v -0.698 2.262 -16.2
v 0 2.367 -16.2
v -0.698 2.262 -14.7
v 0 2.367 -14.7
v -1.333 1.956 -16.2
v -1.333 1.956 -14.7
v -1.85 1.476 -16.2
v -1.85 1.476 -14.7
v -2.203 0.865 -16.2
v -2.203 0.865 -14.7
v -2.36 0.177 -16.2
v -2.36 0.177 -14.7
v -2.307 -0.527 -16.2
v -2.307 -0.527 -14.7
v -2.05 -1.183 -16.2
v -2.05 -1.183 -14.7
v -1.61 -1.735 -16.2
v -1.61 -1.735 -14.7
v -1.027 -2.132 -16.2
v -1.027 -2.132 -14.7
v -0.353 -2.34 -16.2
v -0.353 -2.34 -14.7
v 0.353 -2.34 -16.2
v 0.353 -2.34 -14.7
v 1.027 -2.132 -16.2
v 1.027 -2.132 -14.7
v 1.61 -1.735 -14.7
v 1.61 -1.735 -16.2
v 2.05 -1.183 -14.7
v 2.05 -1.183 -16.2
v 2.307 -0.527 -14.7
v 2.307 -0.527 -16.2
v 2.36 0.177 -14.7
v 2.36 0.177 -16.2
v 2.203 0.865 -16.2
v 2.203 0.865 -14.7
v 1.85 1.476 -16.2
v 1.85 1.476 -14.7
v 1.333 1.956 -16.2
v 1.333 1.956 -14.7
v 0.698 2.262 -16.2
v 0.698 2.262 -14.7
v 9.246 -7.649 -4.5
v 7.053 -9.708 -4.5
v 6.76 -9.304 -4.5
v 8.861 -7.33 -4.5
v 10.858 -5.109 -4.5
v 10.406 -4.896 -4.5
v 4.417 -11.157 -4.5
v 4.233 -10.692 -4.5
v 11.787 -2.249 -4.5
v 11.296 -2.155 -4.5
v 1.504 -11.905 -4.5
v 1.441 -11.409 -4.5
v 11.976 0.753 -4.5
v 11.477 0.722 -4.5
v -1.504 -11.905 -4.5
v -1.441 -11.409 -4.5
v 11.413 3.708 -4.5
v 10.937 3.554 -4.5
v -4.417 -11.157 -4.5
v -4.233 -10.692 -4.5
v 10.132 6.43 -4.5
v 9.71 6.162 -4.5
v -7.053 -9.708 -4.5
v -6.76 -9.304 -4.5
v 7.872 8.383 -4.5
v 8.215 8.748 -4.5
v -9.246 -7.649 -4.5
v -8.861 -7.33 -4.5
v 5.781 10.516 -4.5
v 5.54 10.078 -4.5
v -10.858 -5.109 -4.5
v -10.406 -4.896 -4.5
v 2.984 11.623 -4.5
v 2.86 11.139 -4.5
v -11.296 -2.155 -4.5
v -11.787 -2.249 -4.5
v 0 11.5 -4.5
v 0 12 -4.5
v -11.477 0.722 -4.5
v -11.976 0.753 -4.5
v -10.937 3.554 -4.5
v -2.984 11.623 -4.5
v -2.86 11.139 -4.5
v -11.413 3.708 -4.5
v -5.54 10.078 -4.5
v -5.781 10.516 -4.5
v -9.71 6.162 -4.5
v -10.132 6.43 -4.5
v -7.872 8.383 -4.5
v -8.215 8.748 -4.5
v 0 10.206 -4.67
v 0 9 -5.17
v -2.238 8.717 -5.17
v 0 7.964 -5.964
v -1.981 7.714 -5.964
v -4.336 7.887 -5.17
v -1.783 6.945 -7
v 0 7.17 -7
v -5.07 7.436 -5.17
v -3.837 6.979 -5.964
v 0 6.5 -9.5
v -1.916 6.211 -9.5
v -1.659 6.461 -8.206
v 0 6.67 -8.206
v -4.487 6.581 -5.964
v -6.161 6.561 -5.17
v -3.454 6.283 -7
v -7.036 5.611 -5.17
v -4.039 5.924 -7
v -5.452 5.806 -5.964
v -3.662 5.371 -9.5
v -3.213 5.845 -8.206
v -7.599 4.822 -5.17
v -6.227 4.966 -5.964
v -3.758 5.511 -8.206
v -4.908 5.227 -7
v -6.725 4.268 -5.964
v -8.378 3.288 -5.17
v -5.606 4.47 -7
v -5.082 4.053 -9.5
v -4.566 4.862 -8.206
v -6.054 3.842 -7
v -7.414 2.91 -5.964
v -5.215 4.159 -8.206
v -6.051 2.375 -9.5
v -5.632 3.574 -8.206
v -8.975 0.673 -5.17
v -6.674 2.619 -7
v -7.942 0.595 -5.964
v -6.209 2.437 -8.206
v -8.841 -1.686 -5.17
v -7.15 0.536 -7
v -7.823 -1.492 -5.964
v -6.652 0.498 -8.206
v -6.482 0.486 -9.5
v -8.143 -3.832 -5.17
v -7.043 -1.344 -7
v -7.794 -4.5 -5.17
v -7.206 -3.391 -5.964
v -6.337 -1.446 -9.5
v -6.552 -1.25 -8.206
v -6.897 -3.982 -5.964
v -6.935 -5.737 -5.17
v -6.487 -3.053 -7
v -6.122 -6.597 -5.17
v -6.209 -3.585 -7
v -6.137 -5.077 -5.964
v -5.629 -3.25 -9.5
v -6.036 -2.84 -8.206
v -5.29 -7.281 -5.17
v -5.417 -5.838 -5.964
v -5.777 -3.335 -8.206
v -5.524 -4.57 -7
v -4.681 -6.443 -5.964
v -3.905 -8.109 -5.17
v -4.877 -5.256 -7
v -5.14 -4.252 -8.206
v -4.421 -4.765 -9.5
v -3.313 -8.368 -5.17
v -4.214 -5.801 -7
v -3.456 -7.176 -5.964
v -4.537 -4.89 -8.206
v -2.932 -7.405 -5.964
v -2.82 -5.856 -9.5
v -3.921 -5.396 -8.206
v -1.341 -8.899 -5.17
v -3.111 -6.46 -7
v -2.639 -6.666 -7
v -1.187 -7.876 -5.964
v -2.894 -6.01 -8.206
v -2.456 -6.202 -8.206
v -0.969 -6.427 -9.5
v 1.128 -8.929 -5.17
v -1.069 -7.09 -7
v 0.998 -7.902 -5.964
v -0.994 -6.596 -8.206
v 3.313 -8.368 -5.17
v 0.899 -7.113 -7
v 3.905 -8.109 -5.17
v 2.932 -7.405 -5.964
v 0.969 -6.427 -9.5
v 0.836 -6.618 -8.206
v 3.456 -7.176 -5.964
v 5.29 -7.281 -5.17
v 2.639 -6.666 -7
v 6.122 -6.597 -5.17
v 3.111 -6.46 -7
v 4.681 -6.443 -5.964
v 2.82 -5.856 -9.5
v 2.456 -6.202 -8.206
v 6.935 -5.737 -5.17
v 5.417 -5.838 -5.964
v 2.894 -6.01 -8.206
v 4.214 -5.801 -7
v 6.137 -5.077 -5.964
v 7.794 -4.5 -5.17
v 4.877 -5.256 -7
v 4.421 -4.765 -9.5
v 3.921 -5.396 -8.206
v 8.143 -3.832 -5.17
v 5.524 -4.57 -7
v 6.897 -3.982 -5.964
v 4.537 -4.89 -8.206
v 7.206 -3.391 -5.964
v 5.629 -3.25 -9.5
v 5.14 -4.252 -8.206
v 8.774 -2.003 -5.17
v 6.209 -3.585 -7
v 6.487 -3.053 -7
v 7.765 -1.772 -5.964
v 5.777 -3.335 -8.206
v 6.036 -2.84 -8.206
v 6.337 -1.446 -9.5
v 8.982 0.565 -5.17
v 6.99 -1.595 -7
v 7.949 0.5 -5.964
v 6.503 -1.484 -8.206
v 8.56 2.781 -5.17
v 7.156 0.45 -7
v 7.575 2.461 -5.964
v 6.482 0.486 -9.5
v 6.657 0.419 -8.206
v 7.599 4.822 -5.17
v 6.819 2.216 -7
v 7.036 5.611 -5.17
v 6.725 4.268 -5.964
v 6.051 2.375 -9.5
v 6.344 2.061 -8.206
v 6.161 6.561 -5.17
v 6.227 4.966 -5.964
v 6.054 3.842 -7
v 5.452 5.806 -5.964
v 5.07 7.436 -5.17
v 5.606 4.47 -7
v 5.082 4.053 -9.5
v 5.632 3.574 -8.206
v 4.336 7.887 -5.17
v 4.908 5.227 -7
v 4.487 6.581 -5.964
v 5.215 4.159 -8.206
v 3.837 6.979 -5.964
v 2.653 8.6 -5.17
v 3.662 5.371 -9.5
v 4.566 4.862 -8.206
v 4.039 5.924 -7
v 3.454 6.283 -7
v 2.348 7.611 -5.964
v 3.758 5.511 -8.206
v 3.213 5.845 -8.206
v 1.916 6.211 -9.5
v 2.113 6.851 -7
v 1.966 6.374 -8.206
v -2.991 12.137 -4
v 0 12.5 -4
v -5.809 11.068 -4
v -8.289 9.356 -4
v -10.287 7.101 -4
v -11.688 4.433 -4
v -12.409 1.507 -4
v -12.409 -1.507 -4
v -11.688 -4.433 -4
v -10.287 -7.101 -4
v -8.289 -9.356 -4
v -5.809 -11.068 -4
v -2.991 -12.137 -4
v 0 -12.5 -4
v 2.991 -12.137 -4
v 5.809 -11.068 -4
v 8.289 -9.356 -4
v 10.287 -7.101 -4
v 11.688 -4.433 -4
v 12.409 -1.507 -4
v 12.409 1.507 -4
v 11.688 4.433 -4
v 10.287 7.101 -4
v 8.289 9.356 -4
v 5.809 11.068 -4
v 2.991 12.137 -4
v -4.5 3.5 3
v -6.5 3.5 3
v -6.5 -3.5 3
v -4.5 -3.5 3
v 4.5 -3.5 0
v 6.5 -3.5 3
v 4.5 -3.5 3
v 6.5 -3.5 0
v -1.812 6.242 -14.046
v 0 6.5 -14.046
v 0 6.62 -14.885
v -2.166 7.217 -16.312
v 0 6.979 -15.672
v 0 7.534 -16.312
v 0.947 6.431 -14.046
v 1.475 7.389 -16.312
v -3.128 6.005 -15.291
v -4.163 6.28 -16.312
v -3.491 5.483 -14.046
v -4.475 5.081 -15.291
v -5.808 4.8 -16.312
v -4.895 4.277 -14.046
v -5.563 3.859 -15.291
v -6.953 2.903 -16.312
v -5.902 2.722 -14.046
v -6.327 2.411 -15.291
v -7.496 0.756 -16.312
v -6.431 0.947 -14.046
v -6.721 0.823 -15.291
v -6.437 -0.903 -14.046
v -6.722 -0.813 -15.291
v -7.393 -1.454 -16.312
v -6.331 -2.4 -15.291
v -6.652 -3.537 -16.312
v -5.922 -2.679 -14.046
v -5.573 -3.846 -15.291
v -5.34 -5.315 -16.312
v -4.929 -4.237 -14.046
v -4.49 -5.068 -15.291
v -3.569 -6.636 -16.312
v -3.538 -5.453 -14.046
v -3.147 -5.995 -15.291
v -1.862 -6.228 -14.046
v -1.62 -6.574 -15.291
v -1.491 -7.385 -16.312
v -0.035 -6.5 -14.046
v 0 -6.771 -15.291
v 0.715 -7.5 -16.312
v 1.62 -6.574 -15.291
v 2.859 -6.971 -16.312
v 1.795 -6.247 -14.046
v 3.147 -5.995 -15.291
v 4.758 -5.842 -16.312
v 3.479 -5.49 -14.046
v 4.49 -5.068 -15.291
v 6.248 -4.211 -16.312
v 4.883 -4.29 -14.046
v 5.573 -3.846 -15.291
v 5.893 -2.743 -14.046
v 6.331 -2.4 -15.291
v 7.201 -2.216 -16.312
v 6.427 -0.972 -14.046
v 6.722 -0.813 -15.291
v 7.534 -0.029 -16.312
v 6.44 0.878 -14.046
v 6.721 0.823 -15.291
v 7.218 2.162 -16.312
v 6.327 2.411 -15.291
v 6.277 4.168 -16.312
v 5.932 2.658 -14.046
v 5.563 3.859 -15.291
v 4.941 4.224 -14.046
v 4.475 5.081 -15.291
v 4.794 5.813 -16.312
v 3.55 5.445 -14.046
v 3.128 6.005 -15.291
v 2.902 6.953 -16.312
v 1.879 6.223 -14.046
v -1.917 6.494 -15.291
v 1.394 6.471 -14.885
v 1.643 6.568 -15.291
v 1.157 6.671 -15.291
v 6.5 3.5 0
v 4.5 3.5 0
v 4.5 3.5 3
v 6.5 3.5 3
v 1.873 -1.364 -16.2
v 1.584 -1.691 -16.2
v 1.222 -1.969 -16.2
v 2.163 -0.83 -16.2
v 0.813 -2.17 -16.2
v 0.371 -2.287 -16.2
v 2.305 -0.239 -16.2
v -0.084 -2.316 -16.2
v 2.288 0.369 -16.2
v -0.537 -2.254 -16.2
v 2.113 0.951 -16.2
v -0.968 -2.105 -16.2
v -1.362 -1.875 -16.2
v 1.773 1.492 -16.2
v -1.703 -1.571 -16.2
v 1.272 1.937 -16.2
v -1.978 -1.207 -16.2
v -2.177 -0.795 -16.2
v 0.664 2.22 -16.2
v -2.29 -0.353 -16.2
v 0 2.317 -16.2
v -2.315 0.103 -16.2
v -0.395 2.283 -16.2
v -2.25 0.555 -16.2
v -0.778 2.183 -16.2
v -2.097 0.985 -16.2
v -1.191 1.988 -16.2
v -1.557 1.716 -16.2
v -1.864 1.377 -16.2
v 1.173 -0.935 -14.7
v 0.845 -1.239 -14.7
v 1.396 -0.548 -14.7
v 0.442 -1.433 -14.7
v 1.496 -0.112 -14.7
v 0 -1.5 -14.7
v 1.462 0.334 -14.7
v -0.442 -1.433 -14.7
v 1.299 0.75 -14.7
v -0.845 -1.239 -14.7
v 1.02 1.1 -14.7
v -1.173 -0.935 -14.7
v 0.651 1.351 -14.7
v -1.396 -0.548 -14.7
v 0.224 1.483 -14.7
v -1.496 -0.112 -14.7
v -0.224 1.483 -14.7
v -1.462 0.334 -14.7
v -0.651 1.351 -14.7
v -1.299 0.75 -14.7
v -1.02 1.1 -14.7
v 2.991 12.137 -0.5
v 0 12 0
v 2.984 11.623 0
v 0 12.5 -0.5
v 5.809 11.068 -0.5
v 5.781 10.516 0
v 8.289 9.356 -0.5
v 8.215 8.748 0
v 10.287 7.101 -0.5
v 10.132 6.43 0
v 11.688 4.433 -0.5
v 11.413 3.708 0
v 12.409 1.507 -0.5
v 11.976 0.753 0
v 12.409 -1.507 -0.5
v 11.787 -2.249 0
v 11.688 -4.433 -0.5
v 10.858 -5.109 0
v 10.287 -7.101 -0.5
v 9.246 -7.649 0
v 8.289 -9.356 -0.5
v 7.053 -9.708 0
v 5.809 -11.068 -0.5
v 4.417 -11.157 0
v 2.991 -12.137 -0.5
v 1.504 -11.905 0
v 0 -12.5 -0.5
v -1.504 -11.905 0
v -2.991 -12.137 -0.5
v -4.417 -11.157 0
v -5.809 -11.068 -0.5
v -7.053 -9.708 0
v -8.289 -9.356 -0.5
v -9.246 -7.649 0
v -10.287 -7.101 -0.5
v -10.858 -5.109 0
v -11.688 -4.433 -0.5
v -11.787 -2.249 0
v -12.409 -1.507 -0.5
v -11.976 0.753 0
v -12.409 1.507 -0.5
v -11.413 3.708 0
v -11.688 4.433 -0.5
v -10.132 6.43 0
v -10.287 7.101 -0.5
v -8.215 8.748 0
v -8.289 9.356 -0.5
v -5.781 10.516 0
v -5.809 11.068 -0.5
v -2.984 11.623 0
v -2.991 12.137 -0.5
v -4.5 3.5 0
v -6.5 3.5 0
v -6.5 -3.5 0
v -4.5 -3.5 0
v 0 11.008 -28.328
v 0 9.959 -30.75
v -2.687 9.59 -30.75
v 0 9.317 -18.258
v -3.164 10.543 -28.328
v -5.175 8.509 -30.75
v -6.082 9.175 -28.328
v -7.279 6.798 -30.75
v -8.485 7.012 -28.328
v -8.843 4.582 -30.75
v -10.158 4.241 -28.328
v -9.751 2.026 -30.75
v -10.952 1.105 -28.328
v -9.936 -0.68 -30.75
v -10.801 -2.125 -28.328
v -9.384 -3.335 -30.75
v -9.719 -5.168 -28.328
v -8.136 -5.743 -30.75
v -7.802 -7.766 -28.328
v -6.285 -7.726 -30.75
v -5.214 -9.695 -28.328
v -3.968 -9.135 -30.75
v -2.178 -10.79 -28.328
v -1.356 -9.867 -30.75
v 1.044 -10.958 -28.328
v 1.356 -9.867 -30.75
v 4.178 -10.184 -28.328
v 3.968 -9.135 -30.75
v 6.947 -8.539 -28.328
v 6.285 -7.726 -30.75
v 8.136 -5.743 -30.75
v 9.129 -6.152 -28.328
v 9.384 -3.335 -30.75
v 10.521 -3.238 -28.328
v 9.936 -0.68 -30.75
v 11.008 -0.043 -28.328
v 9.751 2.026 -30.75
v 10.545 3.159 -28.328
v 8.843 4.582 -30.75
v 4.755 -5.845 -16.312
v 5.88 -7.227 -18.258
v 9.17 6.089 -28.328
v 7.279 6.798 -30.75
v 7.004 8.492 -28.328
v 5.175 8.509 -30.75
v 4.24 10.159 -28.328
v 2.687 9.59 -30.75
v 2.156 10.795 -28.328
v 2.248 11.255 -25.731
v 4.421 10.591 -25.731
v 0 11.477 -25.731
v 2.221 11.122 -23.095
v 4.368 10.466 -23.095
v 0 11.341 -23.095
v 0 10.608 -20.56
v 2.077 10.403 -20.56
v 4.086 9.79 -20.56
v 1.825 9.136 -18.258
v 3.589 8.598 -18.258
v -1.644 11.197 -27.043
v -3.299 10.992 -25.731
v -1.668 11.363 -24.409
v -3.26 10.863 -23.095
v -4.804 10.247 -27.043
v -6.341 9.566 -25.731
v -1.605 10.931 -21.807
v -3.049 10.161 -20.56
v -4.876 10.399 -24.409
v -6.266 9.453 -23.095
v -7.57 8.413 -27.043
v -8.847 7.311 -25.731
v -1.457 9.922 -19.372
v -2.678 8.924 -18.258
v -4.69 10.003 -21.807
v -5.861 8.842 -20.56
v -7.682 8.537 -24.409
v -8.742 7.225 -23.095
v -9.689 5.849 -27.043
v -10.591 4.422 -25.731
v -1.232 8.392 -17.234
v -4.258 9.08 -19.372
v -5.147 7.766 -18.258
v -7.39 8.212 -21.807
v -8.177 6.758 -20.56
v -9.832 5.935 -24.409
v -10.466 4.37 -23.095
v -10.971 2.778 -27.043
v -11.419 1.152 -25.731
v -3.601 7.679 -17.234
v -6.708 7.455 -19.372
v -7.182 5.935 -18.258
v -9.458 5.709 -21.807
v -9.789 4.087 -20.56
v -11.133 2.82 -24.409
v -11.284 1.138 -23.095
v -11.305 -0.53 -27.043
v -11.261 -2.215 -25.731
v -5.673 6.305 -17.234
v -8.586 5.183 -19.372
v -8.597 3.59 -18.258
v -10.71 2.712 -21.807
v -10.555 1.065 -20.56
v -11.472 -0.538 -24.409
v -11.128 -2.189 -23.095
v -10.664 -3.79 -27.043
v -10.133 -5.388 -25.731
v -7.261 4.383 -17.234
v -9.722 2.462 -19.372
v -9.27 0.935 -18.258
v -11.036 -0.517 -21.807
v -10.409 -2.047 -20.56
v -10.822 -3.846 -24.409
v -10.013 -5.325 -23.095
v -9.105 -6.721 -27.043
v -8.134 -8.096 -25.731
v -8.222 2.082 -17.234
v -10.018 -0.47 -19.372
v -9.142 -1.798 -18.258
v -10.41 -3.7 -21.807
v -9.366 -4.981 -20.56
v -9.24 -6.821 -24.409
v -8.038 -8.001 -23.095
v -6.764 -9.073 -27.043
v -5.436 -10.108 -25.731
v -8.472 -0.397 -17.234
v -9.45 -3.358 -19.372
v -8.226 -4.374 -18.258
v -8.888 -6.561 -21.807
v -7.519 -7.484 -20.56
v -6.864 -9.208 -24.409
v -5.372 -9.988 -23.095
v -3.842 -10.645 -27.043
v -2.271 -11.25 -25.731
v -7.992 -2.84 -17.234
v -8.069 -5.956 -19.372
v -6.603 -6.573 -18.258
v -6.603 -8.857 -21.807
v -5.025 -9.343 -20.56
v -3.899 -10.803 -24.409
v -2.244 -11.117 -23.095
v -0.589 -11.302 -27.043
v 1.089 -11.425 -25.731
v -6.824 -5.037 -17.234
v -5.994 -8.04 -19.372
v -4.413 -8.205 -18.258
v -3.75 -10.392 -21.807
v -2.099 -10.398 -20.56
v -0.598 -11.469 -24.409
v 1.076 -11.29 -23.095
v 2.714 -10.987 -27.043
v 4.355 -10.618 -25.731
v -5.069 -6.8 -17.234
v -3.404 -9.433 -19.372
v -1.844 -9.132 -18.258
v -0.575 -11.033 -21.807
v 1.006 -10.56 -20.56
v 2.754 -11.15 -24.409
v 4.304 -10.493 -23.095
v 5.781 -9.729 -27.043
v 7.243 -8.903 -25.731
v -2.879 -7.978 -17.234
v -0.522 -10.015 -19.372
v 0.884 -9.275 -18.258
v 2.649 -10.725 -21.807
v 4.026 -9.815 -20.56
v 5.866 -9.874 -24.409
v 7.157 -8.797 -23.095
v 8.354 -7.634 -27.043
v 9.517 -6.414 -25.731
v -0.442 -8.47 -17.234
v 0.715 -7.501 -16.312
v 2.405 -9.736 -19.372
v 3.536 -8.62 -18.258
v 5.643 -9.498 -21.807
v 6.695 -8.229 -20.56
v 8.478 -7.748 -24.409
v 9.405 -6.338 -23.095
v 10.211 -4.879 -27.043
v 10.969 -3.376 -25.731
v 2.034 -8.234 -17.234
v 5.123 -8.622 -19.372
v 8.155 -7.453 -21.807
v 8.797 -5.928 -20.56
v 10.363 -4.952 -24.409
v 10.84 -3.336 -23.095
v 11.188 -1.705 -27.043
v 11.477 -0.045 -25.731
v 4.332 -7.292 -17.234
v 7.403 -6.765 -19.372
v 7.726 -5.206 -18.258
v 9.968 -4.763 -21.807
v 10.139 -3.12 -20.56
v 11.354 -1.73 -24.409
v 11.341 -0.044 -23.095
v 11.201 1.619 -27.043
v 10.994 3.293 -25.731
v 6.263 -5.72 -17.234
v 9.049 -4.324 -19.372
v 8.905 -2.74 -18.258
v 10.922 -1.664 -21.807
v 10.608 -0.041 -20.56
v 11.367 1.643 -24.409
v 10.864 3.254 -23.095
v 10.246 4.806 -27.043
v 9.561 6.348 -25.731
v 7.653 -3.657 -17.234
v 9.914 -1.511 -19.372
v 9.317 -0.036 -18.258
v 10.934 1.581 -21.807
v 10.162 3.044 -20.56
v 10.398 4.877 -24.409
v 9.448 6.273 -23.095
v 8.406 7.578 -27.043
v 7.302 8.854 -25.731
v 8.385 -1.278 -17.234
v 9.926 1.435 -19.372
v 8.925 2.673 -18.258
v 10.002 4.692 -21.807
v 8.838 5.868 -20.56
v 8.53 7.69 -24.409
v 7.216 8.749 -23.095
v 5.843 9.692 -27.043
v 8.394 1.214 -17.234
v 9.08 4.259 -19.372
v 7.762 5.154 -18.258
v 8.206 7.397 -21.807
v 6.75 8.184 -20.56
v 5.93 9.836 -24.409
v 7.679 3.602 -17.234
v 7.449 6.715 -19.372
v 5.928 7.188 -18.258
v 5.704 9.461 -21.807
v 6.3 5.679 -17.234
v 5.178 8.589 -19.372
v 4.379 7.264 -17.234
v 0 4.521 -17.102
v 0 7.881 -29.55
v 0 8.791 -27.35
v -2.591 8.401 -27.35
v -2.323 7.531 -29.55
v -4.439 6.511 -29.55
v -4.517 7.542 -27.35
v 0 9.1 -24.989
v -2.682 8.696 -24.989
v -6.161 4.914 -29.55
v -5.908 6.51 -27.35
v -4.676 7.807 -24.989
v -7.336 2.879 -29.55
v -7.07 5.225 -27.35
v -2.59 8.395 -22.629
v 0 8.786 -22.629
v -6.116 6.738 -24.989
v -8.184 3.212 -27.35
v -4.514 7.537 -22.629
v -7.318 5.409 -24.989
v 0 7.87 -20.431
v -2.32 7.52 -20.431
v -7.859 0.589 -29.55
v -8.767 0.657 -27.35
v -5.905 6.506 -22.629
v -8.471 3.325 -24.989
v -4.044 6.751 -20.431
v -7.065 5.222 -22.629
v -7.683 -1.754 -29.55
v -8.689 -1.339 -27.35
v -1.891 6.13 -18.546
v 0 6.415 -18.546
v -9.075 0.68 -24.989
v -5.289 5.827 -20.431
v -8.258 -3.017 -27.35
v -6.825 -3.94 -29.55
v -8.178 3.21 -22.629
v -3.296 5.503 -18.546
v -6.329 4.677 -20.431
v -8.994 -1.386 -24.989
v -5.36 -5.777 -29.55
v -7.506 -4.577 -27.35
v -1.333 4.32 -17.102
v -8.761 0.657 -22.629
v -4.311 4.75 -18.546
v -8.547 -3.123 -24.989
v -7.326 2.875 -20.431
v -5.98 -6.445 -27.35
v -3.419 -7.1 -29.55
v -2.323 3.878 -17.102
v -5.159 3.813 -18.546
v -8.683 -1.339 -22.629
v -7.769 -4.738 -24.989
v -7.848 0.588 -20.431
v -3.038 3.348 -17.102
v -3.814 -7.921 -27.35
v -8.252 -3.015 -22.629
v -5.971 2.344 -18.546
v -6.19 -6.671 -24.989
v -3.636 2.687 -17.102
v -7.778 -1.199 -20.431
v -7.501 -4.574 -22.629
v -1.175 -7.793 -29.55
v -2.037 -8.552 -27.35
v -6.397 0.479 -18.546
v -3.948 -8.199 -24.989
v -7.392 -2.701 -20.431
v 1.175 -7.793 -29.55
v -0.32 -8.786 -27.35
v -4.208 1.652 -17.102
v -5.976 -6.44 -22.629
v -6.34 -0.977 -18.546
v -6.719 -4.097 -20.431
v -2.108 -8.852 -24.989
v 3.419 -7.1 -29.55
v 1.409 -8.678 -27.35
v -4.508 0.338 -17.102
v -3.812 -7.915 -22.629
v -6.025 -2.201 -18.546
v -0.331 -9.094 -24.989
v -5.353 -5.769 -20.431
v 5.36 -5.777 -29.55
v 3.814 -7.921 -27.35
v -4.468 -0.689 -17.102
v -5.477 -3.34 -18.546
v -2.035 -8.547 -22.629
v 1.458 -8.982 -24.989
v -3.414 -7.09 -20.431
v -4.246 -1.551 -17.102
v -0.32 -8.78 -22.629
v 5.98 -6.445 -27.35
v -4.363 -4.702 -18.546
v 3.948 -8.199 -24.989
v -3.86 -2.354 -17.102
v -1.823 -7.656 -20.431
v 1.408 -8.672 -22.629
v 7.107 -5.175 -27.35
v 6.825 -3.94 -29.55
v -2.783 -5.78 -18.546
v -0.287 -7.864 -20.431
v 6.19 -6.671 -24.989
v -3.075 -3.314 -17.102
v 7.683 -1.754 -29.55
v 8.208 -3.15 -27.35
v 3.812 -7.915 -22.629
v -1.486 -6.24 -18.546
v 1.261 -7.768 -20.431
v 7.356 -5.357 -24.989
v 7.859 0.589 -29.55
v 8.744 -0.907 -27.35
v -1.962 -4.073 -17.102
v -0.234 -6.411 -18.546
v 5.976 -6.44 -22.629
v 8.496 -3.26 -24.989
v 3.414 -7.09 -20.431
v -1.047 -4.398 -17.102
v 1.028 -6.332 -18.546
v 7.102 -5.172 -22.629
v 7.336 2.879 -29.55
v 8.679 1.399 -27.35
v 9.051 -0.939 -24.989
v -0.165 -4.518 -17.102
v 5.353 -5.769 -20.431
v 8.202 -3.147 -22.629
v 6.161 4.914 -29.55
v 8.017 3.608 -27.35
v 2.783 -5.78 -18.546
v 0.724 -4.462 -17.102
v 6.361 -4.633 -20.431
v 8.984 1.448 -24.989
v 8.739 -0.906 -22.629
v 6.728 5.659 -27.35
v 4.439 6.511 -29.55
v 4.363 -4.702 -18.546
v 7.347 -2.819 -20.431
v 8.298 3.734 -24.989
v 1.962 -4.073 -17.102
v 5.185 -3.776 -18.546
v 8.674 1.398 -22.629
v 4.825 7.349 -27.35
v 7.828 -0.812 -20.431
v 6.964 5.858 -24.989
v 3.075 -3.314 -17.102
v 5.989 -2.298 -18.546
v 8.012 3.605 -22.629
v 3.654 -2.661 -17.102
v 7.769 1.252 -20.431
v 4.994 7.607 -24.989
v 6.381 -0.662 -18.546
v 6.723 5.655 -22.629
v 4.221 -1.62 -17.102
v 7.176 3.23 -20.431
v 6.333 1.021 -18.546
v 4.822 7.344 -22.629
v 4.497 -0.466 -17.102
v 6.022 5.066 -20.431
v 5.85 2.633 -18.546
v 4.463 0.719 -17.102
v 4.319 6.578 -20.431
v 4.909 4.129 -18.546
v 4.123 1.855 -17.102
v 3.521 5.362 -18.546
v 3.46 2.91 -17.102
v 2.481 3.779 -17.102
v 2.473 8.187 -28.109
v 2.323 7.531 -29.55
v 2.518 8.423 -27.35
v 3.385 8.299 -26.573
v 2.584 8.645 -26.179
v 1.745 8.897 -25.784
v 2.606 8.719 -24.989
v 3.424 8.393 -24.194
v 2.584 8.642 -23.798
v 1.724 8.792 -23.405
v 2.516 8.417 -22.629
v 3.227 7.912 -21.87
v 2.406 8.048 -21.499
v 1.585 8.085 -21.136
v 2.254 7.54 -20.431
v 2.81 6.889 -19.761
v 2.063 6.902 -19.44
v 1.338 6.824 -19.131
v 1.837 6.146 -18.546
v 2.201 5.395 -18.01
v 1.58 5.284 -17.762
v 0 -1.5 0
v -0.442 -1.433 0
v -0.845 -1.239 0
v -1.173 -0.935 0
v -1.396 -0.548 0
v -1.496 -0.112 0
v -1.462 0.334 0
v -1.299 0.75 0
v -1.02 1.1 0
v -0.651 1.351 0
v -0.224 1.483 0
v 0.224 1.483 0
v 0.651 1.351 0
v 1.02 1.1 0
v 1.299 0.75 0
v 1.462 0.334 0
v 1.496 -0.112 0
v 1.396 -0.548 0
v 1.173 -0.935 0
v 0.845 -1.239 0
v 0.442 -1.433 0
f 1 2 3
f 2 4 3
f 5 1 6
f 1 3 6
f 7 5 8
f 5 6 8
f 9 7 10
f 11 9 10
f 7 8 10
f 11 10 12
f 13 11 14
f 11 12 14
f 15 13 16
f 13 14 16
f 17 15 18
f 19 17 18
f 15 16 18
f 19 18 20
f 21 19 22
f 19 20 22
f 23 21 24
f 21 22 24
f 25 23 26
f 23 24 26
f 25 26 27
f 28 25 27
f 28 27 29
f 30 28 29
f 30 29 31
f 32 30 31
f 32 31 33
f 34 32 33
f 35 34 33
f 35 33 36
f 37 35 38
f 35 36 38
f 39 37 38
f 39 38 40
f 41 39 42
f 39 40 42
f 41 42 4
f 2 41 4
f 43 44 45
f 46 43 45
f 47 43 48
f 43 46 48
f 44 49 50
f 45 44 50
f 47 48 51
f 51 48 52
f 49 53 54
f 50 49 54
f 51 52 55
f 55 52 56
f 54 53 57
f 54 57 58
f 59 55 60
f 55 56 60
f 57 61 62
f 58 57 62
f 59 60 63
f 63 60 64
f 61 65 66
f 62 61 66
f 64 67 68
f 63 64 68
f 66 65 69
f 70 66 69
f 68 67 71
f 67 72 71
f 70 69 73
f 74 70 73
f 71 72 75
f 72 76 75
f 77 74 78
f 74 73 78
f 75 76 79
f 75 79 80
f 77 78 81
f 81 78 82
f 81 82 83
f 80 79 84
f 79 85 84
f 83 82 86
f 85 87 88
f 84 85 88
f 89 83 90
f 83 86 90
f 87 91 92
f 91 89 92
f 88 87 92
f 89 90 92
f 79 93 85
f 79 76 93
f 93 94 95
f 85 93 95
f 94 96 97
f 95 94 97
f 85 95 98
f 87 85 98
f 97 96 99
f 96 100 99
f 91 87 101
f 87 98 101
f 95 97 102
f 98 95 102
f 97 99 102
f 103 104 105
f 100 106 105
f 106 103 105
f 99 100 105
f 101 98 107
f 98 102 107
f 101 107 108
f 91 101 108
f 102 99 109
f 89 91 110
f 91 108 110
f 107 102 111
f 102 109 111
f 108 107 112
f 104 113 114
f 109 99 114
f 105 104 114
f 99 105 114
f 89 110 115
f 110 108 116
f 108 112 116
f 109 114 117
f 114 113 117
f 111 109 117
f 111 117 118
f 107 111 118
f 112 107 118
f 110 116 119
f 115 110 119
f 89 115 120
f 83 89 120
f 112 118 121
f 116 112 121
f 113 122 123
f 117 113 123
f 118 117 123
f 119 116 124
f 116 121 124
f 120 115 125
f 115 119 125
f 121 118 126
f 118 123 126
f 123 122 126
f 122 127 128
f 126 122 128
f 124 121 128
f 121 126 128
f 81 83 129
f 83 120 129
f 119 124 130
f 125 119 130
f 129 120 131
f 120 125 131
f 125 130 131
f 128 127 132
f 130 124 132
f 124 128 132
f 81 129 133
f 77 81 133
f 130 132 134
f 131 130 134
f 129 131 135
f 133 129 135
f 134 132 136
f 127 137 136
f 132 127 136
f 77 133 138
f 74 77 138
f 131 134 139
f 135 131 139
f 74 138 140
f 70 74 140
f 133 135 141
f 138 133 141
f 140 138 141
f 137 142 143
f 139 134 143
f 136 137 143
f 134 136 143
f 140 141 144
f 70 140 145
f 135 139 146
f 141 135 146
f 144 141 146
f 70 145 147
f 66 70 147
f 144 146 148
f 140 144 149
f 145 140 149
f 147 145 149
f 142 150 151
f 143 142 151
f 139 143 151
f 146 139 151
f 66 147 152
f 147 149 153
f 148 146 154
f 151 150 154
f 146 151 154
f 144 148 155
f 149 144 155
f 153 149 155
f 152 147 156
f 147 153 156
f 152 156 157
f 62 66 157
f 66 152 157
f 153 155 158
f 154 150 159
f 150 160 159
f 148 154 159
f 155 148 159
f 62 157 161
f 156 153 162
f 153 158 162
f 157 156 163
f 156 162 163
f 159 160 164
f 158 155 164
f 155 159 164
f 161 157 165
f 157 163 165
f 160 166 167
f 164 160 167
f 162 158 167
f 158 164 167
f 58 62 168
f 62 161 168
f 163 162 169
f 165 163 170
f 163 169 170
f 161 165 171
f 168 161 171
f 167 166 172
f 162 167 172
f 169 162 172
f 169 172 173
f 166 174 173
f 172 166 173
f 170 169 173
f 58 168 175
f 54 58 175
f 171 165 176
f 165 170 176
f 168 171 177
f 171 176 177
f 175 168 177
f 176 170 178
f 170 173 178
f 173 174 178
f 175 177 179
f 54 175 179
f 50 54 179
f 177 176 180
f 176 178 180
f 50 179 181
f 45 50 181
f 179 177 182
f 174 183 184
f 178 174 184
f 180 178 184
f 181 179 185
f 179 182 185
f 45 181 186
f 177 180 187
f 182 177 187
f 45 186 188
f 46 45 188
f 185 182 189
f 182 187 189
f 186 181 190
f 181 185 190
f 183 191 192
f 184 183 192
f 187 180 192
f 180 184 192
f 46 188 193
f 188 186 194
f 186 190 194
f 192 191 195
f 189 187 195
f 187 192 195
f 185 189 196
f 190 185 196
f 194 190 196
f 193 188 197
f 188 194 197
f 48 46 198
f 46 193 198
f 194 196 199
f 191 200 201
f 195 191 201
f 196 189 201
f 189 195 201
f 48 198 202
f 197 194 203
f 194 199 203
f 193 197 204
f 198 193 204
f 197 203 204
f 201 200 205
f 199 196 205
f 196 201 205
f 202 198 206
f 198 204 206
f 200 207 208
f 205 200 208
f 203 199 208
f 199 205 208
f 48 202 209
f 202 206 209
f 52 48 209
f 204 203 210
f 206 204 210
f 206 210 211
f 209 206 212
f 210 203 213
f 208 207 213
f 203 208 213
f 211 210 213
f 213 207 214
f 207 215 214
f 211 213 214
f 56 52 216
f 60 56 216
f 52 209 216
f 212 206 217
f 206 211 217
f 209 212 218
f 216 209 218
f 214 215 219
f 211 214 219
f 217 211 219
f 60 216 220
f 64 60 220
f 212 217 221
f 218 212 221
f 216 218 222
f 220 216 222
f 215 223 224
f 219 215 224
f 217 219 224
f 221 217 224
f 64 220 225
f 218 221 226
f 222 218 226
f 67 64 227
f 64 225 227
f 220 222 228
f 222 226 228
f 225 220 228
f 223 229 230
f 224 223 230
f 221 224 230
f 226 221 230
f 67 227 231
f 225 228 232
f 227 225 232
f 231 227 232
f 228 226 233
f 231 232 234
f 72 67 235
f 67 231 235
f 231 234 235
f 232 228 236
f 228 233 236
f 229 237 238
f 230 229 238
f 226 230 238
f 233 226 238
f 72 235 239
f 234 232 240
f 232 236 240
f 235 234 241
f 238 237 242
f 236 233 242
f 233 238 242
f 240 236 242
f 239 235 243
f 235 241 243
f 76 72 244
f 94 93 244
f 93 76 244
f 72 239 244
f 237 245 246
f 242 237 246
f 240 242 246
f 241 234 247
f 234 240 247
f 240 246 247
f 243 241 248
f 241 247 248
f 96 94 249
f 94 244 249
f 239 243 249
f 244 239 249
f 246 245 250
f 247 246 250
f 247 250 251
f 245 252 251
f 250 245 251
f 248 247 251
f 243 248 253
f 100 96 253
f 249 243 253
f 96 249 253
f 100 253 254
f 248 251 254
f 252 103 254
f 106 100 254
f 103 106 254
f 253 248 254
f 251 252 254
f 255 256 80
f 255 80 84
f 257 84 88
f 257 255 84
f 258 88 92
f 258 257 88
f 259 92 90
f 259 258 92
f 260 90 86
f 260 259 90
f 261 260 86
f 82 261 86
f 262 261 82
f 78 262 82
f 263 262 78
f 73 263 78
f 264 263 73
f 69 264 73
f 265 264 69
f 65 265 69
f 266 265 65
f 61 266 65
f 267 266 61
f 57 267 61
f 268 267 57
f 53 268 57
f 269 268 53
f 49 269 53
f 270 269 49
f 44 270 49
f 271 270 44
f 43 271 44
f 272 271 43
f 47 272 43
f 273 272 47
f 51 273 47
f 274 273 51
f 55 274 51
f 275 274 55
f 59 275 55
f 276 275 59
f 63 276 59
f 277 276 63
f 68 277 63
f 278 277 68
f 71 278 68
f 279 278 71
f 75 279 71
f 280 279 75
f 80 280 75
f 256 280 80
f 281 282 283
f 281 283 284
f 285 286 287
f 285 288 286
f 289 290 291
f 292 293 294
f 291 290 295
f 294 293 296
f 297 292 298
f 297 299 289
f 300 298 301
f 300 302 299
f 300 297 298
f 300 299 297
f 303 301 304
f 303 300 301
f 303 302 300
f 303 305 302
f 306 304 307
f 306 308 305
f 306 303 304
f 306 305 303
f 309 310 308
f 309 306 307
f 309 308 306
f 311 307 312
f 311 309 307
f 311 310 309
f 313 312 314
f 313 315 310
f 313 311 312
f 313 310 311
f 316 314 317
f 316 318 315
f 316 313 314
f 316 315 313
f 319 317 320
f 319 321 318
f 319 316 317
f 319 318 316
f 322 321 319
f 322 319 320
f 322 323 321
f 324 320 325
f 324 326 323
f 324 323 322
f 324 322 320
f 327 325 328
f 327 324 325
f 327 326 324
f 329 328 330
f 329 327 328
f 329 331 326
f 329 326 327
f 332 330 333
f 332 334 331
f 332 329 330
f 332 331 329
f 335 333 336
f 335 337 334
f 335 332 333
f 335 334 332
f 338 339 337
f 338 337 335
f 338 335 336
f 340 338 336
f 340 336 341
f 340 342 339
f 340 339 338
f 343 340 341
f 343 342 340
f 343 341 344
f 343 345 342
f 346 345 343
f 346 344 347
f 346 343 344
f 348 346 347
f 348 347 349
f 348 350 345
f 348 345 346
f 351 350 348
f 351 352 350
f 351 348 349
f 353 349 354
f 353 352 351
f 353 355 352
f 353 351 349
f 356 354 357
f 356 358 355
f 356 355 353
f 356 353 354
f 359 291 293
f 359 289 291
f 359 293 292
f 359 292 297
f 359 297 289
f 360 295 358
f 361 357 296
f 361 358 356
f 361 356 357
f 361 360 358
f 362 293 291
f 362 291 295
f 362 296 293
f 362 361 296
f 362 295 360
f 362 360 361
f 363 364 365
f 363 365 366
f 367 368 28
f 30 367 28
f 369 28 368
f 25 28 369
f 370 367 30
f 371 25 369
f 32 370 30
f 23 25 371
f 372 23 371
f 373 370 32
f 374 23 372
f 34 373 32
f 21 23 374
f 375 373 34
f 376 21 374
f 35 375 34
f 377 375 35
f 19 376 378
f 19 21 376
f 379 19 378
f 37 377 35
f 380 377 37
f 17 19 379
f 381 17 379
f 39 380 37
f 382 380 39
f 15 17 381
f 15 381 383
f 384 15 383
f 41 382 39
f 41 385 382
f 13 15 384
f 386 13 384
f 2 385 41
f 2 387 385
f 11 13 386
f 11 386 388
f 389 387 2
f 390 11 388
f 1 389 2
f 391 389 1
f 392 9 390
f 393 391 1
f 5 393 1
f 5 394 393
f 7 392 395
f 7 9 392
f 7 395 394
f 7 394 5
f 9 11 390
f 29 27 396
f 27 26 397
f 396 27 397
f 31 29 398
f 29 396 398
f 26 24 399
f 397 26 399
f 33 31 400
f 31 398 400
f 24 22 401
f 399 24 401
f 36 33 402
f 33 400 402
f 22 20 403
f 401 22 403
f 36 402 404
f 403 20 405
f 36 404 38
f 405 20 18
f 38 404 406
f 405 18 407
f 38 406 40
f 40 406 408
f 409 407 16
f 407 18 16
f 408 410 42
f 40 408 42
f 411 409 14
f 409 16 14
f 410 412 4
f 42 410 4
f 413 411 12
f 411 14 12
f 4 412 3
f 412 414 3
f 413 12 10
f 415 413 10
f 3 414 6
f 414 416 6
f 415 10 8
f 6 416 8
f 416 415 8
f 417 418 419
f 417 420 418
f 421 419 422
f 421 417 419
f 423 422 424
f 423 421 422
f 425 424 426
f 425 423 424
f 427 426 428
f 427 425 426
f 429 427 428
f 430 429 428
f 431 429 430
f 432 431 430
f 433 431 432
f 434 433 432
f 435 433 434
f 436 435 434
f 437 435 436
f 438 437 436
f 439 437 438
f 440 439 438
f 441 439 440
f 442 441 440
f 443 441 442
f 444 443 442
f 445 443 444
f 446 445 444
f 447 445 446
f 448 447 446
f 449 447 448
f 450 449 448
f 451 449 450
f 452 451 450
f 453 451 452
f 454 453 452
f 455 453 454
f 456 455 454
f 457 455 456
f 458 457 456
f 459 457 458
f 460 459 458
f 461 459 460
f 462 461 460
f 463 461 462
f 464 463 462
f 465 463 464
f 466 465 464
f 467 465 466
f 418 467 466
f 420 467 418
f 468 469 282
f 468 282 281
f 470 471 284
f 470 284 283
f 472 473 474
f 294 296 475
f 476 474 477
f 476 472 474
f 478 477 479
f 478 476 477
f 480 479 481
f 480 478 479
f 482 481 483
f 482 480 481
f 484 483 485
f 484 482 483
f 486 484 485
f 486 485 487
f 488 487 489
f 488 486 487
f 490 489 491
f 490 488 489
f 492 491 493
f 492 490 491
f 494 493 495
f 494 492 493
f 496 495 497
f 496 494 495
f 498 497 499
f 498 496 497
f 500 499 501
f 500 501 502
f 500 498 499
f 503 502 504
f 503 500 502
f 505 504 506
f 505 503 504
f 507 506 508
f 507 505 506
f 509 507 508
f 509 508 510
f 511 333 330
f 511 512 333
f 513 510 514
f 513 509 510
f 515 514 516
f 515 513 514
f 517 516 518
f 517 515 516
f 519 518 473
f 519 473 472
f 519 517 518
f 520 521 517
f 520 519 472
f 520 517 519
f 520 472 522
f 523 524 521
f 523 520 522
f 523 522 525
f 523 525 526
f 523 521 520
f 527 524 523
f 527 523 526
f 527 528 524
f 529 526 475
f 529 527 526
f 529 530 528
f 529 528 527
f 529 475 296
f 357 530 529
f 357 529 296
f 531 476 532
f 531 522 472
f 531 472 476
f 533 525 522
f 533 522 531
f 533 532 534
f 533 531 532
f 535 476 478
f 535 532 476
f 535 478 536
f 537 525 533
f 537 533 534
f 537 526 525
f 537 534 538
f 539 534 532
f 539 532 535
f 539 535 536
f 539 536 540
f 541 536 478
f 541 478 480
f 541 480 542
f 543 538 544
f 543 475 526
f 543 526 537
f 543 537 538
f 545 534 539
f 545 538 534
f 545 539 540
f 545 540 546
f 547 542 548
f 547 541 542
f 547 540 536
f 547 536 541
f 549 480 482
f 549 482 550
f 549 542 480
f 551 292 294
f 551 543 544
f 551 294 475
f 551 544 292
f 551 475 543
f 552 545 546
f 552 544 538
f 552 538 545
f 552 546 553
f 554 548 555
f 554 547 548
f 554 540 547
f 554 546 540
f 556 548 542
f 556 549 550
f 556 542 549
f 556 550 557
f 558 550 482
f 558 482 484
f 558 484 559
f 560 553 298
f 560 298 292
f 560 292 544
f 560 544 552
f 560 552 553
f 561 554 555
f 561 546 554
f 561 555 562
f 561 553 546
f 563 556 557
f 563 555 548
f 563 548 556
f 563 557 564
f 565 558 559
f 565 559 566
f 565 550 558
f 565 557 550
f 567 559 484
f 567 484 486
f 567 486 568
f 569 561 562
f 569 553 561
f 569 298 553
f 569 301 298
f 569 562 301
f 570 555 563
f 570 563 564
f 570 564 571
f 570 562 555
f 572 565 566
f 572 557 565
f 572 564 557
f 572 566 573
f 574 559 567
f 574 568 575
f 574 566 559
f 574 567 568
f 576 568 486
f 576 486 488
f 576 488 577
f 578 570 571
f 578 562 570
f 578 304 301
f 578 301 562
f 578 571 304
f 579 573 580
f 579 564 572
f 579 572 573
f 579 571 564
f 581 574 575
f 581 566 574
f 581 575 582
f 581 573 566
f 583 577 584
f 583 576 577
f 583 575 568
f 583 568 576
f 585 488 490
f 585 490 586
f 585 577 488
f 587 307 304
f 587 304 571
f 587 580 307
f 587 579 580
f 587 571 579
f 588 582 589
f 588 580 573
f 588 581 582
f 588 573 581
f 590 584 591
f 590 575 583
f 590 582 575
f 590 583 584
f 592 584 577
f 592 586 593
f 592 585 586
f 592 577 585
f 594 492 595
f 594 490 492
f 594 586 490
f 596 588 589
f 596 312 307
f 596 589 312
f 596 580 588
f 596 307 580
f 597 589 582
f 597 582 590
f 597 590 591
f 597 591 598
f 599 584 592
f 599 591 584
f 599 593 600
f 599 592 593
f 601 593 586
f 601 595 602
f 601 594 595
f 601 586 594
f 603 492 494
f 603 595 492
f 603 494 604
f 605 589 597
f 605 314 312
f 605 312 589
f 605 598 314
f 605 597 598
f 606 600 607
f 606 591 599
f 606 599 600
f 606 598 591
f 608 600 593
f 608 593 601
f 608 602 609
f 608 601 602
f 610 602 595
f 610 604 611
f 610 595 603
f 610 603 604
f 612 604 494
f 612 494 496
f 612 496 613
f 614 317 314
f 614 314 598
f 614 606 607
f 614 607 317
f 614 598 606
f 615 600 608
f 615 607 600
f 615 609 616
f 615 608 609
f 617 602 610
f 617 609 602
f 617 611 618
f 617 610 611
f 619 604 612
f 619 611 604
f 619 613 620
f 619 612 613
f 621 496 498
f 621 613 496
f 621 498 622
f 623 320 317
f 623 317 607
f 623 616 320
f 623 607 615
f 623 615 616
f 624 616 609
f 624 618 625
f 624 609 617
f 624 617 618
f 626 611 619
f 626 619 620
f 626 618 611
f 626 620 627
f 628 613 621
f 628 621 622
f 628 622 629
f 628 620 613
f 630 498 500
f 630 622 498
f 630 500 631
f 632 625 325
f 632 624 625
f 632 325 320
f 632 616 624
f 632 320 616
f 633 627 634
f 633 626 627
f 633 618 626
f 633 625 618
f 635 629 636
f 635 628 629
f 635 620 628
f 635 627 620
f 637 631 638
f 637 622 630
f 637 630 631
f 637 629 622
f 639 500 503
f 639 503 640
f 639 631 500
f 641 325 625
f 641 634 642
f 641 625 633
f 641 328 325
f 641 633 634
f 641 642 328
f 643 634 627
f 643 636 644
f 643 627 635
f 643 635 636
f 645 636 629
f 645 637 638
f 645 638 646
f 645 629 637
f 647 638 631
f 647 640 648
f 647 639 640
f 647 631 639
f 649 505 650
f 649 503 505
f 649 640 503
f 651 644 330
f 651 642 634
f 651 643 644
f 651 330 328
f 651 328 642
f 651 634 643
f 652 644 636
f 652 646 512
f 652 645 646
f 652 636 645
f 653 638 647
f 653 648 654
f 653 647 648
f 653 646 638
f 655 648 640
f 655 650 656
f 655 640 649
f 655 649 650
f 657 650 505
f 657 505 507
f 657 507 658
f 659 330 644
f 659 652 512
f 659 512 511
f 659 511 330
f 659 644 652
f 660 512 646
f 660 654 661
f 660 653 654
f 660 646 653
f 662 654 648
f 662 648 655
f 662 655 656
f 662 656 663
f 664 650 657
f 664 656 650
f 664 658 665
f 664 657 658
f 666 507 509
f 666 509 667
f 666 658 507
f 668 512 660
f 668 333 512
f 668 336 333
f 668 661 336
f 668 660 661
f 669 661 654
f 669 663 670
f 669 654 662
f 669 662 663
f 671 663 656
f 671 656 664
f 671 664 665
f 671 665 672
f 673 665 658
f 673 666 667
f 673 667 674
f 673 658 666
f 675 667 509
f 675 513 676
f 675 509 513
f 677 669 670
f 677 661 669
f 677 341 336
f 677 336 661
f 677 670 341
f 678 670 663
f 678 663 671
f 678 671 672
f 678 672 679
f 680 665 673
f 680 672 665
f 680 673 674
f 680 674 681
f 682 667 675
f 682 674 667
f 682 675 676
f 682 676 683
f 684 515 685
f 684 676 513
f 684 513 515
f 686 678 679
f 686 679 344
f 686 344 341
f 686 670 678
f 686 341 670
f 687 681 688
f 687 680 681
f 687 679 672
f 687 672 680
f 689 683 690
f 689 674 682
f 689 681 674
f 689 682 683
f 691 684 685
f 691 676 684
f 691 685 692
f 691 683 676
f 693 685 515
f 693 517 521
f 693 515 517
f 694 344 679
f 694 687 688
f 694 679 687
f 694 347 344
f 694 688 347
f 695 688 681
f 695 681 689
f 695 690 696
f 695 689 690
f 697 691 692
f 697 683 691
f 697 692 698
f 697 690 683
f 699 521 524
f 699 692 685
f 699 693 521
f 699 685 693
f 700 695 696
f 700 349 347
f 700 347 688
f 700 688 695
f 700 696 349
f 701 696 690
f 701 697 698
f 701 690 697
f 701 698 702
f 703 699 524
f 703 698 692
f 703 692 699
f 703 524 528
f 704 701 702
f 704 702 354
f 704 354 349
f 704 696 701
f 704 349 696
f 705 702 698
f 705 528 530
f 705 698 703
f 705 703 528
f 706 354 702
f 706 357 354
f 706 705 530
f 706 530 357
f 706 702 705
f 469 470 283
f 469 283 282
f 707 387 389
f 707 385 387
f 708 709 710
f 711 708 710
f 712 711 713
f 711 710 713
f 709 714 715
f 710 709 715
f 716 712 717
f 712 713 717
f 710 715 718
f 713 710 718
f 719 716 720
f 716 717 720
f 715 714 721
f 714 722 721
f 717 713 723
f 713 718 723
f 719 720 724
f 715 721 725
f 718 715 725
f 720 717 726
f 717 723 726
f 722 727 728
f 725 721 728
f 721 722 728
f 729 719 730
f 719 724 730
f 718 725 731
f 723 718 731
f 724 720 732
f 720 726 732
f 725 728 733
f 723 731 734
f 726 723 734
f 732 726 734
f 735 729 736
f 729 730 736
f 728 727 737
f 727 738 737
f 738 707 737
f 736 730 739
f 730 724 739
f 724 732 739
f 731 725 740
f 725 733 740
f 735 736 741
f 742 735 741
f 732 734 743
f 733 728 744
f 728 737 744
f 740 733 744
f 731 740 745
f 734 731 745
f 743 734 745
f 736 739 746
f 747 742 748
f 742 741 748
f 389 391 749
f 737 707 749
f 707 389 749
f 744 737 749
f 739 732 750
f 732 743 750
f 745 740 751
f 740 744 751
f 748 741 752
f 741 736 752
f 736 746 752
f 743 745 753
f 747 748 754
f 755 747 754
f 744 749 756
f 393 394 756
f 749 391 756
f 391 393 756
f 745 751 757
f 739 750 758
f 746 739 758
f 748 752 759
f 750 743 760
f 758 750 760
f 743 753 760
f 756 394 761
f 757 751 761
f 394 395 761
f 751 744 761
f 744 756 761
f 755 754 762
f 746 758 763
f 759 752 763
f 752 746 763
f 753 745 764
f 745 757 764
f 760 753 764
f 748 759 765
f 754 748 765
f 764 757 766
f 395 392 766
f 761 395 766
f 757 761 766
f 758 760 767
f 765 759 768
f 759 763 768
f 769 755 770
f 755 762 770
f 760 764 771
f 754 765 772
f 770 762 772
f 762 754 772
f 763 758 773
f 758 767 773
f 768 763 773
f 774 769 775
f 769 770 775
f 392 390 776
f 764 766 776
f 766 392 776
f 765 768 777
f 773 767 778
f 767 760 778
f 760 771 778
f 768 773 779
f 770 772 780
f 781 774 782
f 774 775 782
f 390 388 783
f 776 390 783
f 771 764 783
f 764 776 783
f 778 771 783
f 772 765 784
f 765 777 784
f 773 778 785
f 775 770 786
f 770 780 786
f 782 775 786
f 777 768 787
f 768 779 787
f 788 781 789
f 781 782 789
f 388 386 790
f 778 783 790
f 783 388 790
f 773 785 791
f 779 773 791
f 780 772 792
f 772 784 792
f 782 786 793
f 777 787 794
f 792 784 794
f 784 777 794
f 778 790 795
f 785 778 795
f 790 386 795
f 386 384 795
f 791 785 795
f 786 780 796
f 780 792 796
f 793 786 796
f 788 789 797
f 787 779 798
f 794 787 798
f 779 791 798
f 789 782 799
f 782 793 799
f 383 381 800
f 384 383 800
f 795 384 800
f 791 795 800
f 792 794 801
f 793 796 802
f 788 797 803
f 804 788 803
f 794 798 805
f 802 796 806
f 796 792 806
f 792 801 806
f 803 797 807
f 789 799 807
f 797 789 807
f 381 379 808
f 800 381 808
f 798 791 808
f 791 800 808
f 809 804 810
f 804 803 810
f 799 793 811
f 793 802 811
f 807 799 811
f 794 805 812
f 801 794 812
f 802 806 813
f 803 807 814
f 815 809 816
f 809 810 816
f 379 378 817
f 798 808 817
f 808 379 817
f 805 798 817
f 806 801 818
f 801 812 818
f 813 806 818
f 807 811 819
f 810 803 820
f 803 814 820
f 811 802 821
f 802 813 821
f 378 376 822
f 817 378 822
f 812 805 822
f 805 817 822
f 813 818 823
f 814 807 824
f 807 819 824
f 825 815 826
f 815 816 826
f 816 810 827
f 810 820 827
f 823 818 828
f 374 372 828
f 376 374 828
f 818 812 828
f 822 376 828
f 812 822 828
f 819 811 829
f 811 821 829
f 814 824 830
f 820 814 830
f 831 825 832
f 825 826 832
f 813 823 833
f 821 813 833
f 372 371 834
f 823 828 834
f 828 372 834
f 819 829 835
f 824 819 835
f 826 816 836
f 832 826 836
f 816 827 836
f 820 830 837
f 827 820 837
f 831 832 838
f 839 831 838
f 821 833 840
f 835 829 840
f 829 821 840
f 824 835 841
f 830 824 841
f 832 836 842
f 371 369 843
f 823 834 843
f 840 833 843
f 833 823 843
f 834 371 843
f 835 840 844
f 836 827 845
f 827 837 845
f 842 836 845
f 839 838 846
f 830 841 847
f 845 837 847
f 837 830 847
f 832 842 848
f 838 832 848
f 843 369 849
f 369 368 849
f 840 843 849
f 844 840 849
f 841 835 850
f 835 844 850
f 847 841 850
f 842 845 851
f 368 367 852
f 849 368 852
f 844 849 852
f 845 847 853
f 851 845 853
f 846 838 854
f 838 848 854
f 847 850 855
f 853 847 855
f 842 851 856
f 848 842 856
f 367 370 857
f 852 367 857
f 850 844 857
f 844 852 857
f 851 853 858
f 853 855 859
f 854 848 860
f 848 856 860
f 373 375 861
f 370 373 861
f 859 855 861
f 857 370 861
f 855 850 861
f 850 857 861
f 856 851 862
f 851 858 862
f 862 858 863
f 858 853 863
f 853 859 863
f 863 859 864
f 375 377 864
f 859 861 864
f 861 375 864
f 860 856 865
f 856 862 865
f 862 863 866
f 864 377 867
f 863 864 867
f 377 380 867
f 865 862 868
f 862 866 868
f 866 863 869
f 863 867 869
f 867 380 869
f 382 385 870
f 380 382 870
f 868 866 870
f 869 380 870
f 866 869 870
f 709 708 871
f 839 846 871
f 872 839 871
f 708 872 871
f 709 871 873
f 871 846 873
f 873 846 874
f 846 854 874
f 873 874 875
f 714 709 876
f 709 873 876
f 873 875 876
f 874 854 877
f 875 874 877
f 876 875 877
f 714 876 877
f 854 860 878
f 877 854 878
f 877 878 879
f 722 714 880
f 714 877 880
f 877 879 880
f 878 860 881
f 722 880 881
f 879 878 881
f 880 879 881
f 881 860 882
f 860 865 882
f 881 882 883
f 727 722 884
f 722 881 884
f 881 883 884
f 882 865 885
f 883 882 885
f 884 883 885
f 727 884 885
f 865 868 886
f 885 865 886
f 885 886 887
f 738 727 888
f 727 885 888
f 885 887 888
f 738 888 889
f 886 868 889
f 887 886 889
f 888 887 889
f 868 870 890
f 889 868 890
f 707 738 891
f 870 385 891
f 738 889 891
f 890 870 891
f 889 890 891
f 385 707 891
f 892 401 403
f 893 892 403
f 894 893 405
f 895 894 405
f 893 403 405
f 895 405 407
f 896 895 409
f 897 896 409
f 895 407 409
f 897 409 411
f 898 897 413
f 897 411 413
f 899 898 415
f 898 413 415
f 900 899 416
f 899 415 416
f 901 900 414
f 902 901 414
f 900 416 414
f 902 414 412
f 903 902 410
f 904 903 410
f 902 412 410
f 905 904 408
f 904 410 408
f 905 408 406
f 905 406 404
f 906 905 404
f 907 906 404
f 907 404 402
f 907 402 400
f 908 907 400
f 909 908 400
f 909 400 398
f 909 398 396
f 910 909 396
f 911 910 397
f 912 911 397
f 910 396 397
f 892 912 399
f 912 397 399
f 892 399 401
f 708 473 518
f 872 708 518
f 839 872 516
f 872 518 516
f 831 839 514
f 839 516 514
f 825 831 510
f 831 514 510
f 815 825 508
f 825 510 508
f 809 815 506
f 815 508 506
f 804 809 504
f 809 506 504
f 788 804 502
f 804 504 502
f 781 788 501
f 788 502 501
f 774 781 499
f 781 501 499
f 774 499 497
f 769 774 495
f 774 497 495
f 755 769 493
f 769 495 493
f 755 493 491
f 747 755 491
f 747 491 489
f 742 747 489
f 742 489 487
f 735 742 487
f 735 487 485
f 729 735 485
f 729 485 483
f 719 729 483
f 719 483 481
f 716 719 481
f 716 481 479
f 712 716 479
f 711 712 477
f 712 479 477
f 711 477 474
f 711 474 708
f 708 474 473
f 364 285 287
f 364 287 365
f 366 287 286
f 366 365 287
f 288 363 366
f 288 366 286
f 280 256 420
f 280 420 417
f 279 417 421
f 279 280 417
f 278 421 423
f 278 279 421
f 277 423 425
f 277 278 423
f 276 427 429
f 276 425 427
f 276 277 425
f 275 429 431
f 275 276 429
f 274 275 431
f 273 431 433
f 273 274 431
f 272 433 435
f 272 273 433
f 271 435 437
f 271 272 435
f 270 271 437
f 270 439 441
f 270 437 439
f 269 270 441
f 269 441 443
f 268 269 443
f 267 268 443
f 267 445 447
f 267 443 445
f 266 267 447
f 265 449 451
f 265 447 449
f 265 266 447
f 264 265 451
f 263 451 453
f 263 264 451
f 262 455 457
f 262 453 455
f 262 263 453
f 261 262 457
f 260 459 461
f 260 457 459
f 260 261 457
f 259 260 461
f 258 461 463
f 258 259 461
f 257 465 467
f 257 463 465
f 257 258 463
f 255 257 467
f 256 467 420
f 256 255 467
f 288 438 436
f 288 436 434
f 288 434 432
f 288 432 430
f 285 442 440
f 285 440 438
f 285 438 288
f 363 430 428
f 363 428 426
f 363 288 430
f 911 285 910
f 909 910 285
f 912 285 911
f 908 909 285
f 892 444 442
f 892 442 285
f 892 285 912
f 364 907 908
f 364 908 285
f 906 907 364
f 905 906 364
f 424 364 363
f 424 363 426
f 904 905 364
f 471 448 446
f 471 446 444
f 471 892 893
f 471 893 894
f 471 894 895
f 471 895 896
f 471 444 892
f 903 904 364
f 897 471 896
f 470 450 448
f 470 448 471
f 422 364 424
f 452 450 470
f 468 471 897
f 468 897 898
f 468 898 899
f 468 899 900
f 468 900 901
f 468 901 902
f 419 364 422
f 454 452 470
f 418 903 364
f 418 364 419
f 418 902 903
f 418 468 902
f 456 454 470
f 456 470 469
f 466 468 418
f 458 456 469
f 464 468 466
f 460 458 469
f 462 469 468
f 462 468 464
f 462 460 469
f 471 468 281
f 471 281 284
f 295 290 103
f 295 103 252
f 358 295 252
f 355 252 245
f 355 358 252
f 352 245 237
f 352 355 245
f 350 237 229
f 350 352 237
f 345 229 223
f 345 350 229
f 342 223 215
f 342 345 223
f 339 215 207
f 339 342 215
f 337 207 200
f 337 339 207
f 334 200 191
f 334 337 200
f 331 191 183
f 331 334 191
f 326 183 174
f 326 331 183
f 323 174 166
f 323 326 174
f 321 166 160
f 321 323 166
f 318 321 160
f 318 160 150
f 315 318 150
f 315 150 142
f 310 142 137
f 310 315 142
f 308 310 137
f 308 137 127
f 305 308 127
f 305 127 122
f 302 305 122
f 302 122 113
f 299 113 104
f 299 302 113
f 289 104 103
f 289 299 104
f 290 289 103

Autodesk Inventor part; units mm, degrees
ref_plane "YZ Plane" through (0, 0, 0) normal (1, 0, 0) x (0, 1, 0)
ref_plane "XZ Plane" through (0, 0, 0) normal (0, 1, 0) x (-1, 0, 0)
ref_plane "XY Plane" through (0, 0, 0) normal (0, 0, 1) x (1, 0, 0)
sketch "Sketch1" plane through (0, 0, 0) normal (1, 0, 0) x (0, 1, 0)
  point P0 (0, 0)
sketch "Sketch2" plane through (0, 0, 0) normal (1, 0, 0) x (0, 1, 0)
  arc A0 (7.8808, -29.55) -> (0, -15.9) centre (0, -25) ccw
  arc A1 (9.9593, -30.75) -> (6.5, -15.5132) centre (0, -25) ccw
  line L0 (0, 0) -> (12.5, 0)
  line L1 (12.5, 0) -> (12.5, -4.5)
  line L2 (12.5, -4.5) -> (6.5, -4.5)
  line L3 (6.5, -4.5) -> (6.5, -15.5132)
  line L4 (7.8808, -29.55) -> (9.9593, -30.75)
  line L5 (0, -15.9) -> (0, 0)
  dimension "d0" = 4.5
  dimension "d2" = 18.2
  dimension "d3" = 23
  dimension "d5" = 25
  dimension "d7" = 12.5
  dimension "d8" = 6.5
  dimension "d9" = 60
revolve "Revolution1" add sketch "Sketch2" angle 360 about axis through (0, 0, -15.9) along (0, 0, 1)
hole "Hole1" at (0, 0, 0) direction (0, 0, -1) diameter 3 end through all
ref_plane "Work Plane1" through (0, 0, -16.2) normal (0, 0, -1) x (-1, 0, 0)
sketch "Sketch3" plane through (0, 0, -16.2) normal (0, 0, -1) x (-1, 0, 0)
  circle A0 centre (0, 0) radius 2.3668
hole "Hole2" at (0, 0, -16.2) direction (0, 0, 1) diameter 4.7336 depth 1.5
chamfer "Chamfer1" distance 0.5 angle 45 1 edges at (0, -12.5, 0)
chamfer "Chamfer2" distance 0.5 angle 45 1 edges at (0, -12.5, -4.5)
fillet "Fillet1" radius 5 1 edges at (0, -6.5, -4.5)
fillet "Fillet2" radius 3 1 edges at (0, -6.5, -15.5132)
sketch "Sketch4" plane through (0, 0, 0) normal (0, 0, 1) x (1, 0, 0)
  line L0 (4.5, -3.5) -> (4.5, 3.5)
  line L1 (4.5, 3.5) -> (6.5, 3.5)
  line L2 (6.5, 3.5) -> (6.5, -3.5)
  line L3 (6.5, -3.5) -> (4.5, -3.5)
  line L4 (-4.5, -3.5) -> (-6.5, -3.5)
  line L5 (-6.5, -3.5) -> (-6.5, 3.5)
  line L6 (-6.5, 3.5) -> (-4.5, 3.5)
  line L7 (-4.5, 3.5) -> (-4.5, -3.5)
  line L8 (0, 0) -> (0, -2.6483) construction
  line L9 (4.5, 0) -> (0, 0) construction
  dimension "d36" = 7
  dimension "d37" = 2
  dimension "d38" = 4.5
extrude "Extrusion1" add sketch "Sketch4" along normal blind 3
properties part number "vertebro_back"
